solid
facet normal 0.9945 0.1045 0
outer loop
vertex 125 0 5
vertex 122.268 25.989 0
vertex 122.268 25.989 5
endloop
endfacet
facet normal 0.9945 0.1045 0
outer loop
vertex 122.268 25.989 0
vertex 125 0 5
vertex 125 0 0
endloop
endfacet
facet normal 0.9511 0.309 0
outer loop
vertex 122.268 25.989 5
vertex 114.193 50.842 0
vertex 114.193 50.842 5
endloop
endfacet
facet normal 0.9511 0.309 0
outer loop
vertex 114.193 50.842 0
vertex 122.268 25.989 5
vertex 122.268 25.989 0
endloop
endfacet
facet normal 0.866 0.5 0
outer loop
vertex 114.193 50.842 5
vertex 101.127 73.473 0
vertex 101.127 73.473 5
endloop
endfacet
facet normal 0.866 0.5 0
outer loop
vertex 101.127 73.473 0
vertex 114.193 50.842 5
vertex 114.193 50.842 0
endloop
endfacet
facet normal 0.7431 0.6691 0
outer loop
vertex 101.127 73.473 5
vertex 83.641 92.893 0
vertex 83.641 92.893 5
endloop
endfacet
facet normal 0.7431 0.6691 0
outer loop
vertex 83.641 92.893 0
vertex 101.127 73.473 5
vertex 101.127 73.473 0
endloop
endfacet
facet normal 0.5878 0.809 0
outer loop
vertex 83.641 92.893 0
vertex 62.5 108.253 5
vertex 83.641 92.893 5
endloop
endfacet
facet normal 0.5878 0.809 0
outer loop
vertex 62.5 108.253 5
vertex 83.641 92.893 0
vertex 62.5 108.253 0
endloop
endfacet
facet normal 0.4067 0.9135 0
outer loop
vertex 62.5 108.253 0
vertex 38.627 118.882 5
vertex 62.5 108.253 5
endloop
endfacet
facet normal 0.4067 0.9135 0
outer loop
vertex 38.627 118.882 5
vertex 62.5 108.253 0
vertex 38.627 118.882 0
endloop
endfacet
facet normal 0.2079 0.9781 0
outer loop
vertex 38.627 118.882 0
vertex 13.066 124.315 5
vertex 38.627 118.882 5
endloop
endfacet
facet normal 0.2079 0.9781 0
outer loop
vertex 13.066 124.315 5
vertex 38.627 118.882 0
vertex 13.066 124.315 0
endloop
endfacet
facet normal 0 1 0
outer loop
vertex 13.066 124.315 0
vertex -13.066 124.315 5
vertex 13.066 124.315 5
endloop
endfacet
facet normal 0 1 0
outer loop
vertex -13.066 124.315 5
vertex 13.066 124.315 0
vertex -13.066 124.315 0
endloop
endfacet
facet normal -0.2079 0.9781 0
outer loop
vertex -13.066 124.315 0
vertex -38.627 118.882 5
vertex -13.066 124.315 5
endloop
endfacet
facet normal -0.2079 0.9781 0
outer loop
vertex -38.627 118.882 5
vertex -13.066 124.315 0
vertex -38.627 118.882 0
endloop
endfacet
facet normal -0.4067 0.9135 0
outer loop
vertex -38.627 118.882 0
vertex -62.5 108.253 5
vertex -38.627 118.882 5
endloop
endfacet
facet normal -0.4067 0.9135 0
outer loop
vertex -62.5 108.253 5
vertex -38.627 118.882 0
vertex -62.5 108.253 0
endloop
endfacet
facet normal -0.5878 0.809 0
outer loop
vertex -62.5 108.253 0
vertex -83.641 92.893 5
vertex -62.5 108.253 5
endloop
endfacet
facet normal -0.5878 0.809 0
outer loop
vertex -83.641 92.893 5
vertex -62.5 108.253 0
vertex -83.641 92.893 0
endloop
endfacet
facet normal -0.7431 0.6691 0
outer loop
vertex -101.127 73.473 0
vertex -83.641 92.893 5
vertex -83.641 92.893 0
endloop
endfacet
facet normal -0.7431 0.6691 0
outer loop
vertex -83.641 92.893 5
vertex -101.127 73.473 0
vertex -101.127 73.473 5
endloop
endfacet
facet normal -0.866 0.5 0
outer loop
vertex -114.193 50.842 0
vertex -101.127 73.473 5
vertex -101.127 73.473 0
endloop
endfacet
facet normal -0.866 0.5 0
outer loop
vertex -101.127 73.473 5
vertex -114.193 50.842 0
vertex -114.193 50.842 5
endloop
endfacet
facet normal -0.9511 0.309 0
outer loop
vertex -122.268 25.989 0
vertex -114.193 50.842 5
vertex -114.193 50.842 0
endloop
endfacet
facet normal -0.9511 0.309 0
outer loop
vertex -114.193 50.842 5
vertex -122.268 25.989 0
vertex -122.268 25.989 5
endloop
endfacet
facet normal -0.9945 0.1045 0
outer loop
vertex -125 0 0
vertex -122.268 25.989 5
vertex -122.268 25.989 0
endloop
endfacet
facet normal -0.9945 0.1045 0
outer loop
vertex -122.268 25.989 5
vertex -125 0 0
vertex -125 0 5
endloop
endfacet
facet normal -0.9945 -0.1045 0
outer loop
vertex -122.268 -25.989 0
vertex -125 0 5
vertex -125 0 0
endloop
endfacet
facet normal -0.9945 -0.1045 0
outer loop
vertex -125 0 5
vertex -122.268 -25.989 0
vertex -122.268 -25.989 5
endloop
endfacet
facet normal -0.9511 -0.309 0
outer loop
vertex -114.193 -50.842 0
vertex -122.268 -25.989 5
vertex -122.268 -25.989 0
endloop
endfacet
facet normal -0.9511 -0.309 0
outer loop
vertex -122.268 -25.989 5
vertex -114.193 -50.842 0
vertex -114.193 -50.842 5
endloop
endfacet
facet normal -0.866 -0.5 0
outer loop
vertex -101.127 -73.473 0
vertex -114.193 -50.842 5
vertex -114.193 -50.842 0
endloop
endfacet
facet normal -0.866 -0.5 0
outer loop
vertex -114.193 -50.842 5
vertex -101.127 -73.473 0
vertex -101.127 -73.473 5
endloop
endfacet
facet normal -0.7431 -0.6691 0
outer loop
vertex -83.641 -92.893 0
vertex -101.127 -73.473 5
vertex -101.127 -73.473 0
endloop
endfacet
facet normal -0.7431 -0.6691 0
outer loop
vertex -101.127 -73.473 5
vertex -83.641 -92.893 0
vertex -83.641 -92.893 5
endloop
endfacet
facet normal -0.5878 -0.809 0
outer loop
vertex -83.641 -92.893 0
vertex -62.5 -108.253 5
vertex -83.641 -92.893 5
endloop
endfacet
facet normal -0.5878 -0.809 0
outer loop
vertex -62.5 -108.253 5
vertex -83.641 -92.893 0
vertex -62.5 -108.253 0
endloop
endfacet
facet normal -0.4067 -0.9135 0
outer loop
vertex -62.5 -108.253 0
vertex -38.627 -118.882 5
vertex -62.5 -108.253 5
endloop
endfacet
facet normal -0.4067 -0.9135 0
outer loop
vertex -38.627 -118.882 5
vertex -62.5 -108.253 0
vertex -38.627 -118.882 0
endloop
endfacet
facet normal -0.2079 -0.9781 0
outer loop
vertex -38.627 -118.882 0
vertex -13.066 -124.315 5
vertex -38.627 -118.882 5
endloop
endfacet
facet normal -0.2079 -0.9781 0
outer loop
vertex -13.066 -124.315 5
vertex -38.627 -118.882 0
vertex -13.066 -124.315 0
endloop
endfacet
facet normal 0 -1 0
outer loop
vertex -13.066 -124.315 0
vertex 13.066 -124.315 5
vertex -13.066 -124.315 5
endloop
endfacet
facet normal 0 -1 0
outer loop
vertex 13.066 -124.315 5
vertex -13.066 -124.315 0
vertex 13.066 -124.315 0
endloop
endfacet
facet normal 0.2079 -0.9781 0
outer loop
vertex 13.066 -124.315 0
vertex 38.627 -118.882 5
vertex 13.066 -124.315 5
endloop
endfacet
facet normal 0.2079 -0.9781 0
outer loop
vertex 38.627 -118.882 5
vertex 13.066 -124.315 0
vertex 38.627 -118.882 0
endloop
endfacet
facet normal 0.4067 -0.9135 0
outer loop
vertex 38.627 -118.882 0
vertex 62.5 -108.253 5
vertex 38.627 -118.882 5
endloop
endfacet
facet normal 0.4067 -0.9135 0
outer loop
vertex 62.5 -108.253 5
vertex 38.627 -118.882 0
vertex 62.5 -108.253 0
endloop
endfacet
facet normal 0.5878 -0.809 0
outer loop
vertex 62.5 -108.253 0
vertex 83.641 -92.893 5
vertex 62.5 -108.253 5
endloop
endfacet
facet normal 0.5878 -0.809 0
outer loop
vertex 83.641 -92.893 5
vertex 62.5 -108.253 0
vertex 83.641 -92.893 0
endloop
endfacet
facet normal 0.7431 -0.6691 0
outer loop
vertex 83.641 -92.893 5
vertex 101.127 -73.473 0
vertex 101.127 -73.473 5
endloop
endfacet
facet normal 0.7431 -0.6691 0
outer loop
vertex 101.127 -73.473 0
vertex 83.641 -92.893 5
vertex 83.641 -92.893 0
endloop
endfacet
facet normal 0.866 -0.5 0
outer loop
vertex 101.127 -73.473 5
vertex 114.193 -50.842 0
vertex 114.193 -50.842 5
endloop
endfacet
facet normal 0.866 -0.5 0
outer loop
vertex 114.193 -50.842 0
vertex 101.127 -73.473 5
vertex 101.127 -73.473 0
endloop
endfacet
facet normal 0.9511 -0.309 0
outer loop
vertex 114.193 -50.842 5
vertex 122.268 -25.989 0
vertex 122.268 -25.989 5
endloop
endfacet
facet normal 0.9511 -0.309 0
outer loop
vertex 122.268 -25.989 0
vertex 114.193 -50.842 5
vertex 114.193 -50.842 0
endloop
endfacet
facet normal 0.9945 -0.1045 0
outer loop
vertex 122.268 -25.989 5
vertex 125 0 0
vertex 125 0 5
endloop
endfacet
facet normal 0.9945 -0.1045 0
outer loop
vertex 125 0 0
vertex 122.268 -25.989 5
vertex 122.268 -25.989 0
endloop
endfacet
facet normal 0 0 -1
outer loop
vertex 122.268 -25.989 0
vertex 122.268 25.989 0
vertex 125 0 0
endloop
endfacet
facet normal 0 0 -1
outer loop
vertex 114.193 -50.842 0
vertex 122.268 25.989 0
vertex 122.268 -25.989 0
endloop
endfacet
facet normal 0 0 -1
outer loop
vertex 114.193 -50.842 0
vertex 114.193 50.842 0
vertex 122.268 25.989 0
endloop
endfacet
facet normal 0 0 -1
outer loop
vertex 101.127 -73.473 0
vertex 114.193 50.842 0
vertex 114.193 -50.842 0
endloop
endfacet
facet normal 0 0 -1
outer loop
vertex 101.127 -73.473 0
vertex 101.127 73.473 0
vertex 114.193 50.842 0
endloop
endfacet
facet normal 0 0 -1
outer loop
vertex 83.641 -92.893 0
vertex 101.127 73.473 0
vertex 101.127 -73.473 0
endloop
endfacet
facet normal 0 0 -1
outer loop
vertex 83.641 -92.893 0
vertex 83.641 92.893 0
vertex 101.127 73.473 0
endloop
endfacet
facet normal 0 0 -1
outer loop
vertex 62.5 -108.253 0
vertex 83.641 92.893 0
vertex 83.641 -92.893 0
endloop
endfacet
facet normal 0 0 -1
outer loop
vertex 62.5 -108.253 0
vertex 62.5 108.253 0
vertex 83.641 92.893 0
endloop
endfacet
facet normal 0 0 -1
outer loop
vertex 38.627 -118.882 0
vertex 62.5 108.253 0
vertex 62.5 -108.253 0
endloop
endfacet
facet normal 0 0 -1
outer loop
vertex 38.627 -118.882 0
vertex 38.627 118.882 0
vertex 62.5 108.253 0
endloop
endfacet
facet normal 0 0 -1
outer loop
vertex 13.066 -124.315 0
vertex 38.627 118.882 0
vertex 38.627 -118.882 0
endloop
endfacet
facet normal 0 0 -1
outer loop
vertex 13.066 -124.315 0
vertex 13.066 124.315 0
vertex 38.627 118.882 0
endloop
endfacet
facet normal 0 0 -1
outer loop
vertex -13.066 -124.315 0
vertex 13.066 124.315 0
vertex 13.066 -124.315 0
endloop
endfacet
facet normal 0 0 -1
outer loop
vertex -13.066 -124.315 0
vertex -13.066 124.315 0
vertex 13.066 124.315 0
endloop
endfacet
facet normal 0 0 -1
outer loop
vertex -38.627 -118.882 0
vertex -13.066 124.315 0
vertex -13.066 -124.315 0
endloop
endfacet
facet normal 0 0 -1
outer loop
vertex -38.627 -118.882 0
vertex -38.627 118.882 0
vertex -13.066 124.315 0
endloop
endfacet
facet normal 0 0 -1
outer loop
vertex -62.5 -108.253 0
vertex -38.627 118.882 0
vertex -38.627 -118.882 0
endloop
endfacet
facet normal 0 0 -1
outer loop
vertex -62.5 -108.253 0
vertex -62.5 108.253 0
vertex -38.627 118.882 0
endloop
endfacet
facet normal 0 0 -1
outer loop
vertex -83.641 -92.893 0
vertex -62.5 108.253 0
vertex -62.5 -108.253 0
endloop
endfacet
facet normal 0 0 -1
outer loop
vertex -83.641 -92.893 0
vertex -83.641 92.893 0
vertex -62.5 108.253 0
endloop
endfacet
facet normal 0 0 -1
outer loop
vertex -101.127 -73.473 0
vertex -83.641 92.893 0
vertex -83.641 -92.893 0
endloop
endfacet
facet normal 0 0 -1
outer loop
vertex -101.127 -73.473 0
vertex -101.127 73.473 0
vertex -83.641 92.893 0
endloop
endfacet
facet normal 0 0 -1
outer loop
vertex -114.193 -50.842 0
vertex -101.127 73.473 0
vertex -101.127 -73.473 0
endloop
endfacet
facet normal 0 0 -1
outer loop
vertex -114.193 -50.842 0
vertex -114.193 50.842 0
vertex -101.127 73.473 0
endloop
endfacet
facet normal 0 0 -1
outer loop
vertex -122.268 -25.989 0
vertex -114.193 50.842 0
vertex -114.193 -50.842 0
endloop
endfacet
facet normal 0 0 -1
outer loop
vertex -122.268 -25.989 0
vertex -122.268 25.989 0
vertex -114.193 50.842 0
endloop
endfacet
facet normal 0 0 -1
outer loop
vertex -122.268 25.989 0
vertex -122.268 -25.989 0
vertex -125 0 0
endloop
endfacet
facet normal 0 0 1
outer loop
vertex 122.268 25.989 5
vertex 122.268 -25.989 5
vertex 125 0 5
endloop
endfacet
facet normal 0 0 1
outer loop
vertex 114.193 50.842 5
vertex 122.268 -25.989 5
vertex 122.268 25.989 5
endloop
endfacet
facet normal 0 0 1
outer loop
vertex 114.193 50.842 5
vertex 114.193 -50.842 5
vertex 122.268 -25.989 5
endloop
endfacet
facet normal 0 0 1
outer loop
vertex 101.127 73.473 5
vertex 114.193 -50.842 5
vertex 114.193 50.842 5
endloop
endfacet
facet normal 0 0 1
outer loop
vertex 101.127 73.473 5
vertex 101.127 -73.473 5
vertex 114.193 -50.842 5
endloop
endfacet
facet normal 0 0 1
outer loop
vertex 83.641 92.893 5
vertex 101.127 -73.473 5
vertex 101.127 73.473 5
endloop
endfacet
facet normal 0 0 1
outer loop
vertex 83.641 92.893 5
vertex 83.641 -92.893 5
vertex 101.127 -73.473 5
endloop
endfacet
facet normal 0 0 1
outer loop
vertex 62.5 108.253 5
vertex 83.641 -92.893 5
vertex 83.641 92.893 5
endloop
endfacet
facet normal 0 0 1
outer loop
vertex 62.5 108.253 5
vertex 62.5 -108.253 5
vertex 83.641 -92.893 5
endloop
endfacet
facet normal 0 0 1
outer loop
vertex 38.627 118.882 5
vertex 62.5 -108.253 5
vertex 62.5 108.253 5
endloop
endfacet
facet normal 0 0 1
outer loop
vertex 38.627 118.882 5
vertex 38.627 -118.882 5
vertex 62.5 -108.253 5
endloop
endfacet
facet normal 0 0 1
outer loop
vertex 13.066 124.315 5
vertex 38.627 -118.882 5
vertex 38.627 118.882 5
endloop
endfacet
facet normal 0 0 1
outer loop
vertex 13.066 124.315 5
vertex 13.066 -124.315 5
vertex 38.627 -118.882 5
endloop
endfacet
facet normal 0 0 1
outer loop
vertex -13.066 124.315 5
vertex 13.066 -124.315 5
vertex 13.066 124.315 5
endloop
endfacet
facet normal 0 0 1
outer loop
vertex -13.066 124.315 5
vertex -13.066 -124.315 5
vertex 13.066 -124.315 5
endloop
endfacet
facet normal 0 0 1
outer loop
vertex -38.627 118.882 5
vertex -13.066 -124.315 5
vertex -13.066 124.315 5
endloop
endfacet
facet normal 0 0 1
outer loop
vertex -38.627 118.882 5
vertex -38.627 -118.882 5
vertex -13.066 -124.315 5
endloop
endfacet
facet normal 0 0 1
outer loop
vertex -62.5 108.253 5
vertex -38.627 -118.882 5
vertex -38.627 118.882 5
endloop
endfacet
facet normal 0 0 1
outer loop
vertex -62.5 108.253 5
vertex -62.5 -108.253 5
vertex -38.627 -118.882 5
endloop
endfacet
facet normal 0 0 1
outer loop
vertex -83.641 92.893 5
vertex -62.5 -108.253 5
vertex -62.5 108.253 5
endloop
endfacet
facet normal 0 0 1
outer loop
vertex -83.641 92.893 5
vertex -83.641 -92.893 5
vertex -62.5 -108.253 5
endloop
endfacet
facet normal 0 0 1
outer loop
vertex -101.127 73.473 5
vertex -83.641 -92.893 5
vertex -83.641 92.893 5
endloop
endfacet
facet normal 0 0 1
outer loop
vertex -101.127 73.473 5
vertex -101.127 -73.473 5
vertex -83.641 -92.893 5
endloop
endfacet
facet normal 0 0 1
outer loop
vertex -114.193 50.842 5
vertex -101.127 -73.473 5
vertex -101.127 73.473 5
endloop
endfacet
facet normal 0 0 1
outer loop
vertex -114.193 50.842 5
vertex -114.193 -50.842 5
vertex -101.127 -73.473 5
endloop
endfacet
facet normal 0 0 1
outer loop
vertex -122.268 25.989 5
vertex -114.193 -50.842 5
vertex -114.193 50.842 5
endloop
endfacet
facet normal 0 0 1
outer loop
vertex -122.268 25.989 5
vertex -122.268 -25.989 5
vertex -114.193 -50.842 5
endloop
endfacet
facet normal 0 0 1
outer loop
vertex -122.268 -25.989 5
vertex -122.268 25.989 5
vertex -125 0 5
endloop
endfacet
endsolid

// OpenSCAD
// file: parameters.scad
rotor_diameter = 250;
arm_pipe_diameter = 20;
arm_pipe_inner_diameter = 18;

M3_screw_diameter = 3;
global_clearence = 0.1;

// motor parameters ======================================
motor_diameter = 40;
motor_height = 18;
motor_n_screws = 4;
motor_screws_diameter = 20;


// motor holder para. (666_1001) =========================
motor_plate_height = 7;
motor_plate_diameter = motor_diameter;
motor_plate_hole_diameter = 10;
motor_tube_x_offset = motor_diameter/2 - 5;
motor_tube_z_offset = 20;

screws_n = 2;
screws_gap = 15;
screws_offset_x = 7.5;
screws_offset_y = 5;
holding_part_x = 30;
upper_holding_part_height = 15;
washer_size_x = 10;
// main file
include <parameters.scad>;

cylinder(5, d=rotor_diameter, true);
